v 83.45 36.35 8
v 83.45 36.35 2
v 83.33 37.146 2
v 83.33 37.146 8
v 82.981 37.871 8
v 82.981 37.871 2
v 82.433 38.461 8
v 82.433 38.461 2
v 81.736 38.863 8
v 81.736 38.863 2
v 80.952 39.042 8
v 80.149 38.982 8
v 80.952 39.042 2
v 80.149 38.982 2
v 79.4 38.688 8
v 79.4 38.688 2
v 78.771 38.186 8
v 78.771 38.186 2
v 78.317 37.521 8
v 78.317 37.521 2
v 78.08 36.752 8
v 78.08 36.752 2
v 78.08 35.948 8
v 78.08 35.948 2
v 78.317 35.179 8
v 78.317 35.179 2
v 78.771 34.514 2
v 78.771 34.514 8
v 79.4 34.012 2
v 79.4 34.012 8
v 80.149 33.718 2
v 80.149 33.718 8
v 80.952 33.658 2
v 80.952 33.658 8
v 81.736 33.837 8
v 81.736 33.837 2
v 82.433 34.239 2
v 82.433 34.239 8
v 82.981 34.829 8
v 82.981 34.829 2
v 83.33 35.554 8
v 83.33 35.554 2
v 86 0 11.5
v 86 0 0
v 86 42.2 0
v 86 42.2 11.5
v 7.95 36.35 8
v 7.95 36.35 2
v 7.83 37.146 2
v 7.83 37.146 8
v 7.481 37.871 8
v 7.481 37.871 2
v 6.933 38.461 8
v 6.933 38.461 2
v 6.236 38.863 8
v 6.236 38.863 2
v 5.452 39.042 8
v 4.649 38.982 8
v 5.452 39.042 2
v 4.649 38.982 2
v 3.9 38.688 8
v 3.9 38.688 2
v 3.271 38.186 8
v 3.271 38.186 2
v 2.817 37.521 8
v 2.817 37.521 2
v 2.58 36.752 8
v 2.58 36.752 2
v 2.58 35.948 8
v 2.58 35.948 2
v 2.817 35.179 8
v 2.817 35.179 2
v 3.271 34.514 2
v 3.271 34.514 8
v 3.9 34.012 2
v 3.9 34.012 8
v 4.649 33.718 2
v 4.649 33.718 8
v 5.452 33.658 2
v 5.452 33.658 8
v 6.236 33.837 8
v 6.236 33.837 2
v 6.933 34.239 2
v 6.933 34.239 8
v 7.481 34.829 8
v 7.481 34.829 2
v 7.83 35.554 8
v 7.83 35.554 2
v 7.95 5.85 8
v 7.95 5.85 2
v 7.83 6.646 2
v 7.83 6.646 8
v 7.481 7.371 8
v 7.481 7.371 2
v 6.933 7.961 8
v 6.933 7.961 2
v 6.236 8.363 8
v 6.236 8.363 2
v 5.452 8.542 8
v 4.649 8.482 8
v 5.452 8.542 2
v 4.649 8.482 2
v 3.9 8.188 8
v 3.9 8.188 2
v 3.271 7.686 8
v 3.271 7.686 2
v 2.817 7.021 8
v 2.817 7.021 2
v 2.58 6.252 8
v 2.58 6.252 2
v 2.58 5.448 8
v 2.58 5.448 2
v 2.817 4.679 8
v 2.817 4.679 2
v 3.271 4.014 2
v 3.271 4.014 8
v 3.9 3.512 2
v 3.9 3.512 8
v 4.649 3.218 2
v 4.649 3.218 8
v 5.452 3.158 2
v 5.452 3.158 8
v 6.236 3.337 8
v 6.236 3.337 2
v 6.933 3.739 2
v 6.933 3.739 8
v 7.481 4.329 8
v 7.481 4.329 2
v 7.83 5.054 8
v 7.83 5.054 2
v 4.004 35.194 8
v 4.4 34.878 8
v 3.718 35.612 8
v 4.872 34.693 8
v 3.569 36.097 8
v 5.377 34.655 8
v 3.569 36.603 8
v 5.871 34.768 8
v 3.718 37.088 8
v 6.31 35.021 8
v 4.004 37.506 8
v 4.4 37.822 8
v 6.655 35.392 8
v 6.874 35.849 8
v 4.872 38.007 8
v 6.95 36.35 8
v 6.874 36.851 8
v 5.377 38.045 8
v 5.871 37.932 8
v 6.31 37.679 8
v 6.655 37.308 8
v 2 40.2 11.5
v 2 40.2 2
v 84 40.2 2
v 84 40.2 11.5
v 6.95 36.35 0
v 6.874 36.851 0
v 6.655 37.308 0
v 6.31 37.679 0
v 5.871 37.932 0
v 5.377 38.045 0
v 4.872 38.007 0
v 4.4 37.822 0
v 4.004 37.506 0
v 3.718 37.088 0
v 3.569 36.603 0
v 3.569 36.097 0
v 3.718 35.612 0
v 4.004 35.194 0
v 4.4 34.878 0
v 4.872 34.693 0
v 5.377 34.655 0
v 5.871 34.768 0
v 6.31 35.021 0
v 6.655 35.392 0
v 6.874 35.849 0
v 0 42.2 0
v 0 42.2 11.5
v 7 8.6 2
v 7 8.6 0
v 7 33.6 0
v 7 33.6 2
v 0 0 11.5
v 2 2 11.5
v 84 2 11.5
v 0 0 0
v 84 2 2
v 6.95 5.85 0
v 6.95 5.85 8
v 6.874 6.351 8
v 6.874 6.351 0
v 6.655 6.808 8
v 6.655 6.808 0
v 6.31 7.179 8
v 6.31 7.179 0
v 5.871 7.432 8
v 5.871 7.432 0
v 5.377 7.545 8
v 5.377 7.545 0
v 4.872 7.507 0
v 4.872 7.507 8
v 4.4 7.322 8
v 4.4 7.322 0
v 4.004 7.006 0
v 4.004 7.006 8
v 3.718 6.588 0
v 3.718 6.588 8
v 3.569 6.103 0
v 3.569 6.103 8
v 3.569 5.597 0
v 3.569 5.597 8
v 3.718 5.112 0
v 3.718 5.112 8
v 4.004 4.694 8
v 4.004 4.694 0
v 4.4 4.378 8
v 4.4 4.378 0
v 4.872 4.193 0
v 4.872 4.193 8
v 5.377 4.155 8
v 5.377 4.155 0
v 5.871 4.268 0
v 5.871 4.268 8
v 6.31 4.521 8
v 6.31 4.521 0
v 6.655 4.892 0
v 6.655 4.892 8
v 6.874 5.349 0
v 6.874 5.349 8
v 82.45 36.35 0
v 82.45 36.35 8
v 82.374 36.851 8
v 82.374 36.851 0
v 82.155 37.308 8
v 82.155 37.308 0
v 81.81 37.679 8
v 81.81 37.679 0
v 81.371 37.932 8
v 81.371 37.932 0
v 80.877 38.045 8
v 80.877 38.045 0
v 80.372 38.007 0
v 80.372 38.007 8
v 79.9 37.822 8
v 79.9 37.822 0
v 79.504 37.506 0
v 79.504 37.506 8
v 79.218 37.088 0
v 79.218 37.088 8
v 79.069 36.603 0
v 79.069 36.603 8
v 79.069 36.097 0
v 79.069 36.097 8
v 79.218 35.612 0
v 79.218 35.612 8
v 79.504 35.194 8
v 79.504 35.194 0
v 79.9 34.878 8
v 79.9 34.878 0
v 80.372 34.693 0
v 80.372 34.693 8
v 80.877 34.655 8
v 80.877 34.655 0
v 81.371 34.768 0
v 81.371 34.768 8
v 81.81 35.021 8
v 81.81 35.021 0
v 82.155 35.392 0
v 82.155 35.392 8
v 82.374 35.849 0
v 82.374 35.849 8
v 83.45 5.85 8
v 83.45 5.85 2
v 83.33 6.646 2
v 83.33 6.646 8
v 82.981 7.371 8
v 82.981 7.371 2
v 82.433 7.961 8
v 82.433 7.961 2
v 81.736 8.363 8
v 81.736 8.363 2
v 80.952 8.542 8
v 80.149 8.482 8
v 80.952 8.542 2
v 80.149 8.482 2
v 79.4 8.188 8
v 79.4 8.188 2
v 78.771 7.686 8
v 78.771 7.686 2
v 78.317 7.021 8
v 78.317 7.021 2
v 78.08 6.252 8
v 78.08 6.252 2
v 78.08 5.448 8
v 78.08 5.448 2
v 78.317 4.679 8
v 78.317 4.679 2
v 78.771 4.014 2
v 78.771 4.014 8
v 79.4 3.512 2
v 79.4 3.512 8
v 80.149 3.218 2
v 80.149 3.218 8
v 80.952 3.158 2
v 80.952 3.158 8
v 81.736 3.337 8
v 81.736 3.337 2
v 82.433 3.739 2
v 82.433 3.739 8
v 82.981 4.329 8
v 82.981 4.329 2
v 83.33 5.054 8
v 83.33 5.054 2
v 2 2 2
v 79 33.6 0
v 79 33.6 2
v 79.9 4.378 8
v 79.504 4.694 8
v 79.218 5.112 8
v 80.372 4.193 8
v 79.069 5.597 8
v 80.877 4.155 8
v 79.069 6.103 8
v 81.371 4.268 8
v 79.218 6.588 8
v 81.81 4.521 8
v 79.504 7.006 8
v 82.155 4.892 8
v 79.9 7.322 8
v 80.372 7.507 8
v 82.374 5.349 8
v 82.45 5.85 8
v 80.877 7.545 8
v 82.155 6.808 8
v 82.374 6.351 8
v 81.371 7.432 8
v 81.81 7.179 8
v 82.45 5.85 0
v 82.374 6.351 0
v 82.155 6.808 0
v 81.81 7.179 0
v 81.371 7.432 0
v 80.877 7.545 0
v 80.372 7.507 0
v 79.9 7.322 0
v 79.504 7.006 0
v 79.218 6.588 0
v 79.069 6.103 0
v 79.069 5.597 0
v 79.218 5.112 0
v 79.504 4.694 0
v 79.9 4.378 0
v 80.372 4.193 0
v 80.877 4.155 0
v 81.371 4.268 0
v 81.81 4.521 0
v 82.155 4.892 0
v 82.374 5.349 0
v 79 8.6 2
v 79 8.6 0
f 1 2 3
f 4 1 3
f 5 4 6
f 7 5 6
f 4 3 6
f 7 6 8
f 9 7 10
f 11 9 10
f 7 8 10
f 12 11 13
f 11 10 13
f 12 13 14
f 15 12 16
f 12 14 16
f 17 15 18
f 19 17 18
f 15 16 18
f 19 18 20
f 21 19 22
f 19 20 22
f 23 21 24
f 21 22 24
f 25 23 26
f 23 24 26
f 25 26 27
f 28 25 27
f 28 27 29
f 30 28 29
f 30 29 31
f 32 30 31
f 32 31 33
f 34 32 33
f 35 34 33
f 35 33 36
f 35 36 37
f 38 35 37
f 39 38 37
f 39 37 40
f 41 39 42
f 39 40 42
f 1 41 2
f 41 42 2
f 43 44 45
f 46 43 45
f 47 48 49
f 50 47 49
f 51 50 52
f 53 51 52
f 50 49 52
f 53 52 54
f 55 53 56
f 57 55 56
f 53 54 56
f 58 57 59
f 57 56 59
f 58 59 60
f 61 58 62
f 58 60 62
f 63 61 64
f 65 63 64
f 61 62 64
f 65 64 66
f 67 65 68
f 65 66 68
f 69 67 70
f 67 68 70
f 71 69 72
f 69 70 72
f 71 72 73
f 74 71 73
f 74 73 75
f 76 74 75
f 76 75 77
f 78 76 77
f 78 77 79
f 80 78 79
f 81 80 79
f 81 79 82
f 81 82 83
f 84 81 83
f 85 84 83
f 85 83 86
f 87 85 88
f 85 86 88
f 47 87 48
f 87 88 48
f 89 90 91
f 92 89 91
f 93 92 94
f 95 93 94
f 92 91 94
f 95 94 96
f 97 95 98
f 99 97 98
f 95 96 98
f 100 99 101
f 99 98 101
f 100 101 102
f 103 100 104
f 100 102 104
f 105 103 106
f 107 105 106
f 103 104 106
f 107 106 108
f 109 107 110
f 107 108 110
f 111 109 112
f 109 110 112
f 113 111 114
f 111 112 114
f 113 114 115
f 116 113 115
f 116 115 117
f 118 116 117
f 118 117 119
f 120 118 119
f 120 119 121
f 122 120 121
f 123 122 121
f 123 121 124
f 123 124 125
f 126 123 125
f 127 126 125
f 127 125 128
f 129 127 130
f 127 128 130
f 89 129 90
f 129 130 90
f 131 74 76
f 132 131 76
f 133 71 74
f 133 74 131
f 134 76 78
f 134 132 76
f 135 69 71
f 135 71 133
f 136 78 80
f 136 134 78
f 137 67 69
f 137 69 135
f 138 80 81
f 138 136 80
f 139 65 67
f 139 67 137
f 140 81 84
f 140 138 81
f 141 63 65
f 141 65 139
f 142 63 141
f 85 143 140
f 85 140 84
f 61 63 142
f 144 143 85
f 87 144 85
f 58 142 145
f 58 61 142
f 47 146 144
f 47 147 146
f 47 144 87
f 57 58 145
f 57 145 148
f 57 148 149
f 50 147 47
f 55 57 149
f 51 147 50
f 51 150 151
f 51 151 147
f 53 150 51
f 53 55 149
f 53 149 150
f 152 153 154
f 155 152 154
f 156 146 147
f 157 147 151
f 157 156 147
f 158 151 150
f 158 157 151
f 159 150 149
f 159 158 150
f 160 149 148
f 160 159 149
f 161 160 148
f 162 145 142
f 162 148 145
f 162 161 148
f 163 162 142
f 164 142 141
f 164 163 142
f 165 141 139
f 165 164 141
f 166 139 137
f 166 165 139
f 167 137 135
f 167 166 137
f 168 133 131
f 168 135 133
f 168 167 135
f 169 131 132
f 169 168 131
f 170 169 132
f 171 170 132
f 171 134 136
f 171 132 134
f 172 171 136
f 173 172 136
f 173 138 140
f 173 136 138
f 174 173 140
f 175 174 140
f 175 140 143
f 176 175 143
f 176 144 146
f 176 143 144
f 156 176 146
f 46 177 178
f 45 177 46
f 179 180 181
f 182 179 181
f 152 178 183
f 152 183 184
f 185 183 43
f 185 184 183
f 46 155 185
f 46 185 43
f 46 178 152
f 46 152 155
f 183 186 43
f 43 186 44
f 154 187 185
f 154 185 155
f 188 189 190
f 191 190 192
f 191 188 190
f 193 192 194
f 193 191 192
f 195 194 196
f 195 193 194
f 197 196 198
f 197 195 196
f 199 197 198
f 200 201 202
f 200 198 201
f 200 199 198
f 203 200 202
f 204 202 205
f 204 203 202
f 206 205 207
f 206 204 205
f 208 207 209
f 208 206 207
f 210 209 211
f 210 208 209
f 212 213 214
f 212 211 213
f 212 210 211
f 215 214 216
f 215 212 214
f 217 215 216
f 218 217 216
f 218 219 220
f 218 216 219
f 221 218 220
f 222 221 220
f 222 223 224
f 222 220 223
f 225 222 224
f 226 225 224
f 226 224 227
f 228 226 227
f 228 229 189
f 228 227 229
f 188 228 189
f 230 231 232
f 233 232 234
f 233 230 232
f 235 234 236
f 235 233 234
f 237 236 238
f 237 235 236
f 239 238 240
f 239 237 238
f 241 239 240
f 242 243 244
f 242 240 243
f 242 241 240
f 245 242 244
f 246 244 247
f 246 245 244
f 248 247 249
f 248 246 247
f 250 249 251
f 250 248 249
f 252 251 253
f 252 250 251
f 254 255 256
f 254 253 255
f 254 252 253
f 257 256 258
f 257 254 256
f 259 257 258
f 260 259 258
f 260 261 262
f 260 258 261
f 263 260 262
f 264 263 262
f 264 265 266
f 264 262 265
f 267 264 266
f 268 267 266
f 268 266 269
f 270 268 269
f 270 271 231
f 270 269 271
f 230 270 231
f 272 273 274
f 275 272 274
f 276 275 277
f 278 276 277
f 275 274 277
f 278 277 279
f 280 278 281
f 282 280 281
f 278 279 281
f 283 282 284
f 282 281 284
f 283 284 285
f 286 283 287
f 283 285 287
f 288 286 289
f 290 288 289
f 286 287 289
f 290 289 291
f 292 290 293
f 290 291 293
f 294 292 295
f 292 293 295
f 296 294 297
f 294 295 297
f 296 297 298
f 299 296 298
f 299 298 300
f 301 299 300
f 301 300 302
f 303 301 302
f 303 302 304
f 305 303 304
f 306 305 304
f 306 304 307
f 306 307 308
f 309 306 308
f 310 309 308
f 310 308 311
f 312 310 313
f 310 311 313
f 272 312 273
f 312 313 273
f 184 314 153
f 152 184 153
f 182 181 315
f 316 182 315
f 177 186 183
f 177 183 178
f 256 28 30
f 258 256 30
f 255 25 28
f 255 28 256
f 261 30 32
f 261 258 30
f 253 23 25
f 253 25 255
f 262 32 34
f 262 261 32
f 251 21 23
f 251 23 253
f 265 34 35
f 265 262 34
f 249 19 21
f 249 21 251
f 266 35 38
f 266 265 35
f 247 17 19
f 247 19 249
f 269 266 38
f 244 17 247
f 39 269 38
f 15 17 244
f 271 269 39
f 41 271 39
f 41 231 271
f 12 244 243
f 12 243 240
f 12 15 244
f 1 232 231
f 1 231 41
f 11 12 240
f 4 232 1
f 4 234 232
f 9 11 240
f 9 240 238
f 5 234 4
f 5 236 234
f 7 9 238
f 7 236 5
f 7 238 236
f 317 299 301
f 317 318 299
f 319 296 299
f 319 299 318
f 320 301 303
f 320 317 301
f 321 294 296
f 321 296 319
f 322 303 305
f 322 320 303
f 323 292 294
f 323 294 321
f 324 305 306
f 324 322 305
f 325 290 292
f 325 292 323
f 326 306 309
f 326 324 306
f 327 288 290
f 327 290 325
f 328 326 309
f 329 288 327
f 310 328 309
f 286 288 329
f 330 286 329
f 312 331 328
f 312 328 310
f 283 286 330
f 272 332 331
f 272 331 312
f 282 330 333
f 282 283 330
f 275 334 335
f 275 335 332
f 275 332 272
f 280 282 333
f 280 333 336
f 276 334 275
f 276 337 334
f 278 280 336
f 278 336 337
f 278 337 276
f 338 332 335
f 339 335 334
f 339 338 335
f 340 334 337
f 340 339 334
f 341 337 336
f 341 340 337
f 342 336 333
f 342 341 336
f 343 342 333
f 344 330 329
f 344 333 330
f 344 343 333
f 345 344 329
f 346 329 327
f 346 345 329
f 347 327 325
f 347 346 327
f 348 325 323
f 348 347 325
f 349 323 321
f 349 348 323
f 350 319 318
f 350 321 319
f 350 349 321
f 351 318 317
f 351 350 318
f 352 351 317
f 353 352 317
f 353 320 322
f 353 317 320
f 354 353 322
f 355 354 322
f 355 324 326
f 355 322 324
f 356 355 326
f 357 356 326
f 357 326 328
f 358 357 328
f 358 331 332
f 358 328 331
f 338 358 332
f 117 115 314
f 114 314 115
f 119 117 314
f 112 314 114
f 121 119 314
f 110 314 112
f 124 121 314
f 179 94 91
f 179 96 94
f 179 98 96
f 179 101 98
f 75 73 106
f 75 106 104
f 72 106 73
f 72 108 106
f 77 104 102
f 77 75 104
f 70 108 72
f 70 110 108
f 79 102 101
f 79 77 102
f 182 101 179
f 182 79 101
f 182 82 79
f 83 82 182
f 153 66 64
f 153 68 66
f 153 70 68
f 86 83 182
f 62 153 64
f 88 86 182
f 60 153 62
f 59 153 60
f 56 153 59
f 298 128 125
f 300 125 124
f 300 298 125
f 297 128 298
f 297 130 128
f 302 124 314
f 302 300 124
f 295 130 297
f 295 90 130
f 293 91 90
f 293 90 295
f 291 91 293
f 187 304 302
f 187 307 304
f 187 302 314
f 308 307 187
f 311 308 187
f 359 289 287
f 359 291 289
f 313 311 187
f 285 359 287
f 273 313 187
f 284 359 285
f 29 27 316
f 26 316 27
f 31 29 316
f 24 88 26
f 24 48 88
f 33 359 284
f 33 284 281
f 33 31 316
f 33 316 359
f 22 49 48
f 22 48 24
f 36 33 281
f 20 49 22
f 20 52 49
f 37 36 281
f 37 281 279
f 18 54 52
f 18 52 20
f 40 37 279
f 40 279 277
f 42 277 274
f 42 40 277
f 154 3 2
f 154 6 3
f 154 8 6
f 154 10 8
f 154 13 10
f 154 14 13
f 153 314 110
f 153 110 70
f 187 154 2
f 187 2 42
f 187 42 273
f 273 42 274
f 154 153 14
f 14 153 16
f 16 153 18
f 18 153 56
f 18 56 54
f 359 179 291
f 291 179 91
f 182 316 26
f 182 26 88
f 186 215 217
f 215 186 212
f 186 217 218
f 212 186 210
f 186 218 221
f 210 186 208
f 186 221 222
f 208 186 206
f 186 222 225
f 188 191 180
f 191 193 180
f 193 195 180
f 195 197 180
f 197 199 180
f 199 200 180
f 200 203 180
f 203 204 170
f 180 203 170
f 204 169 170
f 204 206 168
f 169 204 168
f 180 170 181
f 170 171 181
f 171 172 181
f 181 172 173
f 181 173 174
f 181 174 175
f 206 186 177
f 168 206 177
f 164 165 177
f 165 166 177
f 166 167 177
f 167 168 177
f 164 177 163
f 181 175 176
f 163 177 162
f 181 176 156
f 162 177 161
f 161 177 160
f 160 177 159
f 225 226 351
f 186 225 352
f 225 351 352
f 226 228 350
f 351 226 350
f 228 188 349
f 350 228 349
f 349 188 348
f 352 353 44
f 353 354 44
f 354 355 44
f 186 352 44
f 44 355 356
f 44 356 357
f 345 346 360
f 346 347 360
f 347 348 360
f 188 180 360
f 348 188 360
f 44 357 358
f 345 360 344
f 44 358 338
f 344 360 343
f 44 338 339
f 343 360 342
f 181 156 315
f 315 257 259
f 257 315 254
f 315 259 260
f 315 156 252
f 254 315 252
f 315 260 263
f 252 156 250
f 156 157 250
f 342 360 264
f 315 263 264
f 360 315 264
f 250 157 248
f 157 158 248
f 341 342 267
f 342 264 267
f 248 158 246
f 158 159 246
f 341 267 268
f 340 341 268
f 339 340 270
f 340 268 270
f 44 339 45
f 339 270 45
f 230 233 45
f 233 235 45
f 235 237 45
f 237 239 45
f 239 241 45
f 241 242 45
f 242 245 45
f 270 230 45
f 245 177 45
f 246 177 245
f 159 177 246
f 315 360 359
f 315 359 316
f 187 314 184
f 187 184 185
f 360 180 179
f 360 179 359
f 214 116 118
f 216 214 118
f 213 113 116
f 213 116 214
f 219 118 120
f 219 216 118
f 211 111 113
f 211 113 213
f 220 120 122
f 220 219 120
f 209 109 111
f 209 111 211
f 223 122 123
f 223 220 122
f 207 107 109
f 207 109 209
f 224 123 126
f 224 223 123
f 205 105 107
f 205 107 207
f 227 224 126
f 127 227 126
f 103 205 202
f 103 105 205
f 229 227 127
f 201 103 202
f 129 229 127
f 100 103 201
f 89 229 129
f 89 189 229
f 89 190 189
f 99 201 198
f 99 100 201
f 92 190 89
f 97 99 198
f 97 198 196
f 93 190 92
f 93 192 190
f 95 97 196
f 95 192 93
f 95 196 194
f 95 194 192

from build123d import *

# Parameters (mm, degrees)
BOX010_W        = 86
BOX010_H        = 42.2
BOX010_DEPTH    = 11.5
BOX011_W        = 82
BOX011_H        = 38.2
BOX011_DEPTH    = 9.5
SKETCH022_R     = 2.7
PAD017_DEPTH    = 6
SKETCH023_W     = 72
SKETCH023_H     = 25
POCKET005_DEPTH = 2
SKETCH024_R     = 1.7
POCKET006_DEPTH = 20


with BuildPart() as part:
    # Box010 → Box010 (join)
    with BuildSketch(Plane.XY):
        with Locations((43, 21.1)):
            Rectangle(BOX010_W, BOX010_H)
    extrude(amount=BOX010_DEPTH)

    # Box011 → Box011 (cut)
    with BuildSketch(Plane(origin=(2, 2, 2), x_dir=(1, 0, 0), z_dir=(0, 0, 1))):
        with Locations((41, 19.1)):
            Rectangle(BOX011_W, BOX011_H)
    extrude(amount=BOX011_DEPTH, mode=Mode.SUBTRACT)

    # Sketch022 → Pad017 (join)
    with BuildSketch(Plane.XY.offset(2)):
        with Locations((5.25, 36.35)):
            Circle(SKETCH022_R)
        with Locations((80.75, 36.35)):
            Circle(SKETCH022_R)
        with Locations((80.75, 5.85)):
            Circle(SKETCH022_R)
        with Locations((5.25, 5.85)):
            Circle(SKETCH022_R)
    extrude(amount=PAD017_DEPTH)

    # Sketch023 → Pocket005 (cut)
    with BuildSketch(Plane.XY):
        with Locations((43, 21.1)):
            Rectangle(SKETCH023_W, SKETCH023_H)
    extrude(amount=POCKET005_DEPTH, mode=Mode.SUBTRACT)

    # Sketch024 → Pocket006 (cut)
    with BuildSketch(Plane.XY):
        with Locations((5.25, 36.35)):
            Circle(SKETCH024_R)
        with Locations((80.75, 36.35)):
            Circle(SKETCH024_R)
        with Locations((80.75, 5.85)):
            Circle(SKETCH024_R)
        with Locations((5.25, 5.85)):
            Circle(SKETCH024_R)
    extrude(amount=POCKET006_DEPTH, mode=Mode.SUBTRACT)


solid = part.part
